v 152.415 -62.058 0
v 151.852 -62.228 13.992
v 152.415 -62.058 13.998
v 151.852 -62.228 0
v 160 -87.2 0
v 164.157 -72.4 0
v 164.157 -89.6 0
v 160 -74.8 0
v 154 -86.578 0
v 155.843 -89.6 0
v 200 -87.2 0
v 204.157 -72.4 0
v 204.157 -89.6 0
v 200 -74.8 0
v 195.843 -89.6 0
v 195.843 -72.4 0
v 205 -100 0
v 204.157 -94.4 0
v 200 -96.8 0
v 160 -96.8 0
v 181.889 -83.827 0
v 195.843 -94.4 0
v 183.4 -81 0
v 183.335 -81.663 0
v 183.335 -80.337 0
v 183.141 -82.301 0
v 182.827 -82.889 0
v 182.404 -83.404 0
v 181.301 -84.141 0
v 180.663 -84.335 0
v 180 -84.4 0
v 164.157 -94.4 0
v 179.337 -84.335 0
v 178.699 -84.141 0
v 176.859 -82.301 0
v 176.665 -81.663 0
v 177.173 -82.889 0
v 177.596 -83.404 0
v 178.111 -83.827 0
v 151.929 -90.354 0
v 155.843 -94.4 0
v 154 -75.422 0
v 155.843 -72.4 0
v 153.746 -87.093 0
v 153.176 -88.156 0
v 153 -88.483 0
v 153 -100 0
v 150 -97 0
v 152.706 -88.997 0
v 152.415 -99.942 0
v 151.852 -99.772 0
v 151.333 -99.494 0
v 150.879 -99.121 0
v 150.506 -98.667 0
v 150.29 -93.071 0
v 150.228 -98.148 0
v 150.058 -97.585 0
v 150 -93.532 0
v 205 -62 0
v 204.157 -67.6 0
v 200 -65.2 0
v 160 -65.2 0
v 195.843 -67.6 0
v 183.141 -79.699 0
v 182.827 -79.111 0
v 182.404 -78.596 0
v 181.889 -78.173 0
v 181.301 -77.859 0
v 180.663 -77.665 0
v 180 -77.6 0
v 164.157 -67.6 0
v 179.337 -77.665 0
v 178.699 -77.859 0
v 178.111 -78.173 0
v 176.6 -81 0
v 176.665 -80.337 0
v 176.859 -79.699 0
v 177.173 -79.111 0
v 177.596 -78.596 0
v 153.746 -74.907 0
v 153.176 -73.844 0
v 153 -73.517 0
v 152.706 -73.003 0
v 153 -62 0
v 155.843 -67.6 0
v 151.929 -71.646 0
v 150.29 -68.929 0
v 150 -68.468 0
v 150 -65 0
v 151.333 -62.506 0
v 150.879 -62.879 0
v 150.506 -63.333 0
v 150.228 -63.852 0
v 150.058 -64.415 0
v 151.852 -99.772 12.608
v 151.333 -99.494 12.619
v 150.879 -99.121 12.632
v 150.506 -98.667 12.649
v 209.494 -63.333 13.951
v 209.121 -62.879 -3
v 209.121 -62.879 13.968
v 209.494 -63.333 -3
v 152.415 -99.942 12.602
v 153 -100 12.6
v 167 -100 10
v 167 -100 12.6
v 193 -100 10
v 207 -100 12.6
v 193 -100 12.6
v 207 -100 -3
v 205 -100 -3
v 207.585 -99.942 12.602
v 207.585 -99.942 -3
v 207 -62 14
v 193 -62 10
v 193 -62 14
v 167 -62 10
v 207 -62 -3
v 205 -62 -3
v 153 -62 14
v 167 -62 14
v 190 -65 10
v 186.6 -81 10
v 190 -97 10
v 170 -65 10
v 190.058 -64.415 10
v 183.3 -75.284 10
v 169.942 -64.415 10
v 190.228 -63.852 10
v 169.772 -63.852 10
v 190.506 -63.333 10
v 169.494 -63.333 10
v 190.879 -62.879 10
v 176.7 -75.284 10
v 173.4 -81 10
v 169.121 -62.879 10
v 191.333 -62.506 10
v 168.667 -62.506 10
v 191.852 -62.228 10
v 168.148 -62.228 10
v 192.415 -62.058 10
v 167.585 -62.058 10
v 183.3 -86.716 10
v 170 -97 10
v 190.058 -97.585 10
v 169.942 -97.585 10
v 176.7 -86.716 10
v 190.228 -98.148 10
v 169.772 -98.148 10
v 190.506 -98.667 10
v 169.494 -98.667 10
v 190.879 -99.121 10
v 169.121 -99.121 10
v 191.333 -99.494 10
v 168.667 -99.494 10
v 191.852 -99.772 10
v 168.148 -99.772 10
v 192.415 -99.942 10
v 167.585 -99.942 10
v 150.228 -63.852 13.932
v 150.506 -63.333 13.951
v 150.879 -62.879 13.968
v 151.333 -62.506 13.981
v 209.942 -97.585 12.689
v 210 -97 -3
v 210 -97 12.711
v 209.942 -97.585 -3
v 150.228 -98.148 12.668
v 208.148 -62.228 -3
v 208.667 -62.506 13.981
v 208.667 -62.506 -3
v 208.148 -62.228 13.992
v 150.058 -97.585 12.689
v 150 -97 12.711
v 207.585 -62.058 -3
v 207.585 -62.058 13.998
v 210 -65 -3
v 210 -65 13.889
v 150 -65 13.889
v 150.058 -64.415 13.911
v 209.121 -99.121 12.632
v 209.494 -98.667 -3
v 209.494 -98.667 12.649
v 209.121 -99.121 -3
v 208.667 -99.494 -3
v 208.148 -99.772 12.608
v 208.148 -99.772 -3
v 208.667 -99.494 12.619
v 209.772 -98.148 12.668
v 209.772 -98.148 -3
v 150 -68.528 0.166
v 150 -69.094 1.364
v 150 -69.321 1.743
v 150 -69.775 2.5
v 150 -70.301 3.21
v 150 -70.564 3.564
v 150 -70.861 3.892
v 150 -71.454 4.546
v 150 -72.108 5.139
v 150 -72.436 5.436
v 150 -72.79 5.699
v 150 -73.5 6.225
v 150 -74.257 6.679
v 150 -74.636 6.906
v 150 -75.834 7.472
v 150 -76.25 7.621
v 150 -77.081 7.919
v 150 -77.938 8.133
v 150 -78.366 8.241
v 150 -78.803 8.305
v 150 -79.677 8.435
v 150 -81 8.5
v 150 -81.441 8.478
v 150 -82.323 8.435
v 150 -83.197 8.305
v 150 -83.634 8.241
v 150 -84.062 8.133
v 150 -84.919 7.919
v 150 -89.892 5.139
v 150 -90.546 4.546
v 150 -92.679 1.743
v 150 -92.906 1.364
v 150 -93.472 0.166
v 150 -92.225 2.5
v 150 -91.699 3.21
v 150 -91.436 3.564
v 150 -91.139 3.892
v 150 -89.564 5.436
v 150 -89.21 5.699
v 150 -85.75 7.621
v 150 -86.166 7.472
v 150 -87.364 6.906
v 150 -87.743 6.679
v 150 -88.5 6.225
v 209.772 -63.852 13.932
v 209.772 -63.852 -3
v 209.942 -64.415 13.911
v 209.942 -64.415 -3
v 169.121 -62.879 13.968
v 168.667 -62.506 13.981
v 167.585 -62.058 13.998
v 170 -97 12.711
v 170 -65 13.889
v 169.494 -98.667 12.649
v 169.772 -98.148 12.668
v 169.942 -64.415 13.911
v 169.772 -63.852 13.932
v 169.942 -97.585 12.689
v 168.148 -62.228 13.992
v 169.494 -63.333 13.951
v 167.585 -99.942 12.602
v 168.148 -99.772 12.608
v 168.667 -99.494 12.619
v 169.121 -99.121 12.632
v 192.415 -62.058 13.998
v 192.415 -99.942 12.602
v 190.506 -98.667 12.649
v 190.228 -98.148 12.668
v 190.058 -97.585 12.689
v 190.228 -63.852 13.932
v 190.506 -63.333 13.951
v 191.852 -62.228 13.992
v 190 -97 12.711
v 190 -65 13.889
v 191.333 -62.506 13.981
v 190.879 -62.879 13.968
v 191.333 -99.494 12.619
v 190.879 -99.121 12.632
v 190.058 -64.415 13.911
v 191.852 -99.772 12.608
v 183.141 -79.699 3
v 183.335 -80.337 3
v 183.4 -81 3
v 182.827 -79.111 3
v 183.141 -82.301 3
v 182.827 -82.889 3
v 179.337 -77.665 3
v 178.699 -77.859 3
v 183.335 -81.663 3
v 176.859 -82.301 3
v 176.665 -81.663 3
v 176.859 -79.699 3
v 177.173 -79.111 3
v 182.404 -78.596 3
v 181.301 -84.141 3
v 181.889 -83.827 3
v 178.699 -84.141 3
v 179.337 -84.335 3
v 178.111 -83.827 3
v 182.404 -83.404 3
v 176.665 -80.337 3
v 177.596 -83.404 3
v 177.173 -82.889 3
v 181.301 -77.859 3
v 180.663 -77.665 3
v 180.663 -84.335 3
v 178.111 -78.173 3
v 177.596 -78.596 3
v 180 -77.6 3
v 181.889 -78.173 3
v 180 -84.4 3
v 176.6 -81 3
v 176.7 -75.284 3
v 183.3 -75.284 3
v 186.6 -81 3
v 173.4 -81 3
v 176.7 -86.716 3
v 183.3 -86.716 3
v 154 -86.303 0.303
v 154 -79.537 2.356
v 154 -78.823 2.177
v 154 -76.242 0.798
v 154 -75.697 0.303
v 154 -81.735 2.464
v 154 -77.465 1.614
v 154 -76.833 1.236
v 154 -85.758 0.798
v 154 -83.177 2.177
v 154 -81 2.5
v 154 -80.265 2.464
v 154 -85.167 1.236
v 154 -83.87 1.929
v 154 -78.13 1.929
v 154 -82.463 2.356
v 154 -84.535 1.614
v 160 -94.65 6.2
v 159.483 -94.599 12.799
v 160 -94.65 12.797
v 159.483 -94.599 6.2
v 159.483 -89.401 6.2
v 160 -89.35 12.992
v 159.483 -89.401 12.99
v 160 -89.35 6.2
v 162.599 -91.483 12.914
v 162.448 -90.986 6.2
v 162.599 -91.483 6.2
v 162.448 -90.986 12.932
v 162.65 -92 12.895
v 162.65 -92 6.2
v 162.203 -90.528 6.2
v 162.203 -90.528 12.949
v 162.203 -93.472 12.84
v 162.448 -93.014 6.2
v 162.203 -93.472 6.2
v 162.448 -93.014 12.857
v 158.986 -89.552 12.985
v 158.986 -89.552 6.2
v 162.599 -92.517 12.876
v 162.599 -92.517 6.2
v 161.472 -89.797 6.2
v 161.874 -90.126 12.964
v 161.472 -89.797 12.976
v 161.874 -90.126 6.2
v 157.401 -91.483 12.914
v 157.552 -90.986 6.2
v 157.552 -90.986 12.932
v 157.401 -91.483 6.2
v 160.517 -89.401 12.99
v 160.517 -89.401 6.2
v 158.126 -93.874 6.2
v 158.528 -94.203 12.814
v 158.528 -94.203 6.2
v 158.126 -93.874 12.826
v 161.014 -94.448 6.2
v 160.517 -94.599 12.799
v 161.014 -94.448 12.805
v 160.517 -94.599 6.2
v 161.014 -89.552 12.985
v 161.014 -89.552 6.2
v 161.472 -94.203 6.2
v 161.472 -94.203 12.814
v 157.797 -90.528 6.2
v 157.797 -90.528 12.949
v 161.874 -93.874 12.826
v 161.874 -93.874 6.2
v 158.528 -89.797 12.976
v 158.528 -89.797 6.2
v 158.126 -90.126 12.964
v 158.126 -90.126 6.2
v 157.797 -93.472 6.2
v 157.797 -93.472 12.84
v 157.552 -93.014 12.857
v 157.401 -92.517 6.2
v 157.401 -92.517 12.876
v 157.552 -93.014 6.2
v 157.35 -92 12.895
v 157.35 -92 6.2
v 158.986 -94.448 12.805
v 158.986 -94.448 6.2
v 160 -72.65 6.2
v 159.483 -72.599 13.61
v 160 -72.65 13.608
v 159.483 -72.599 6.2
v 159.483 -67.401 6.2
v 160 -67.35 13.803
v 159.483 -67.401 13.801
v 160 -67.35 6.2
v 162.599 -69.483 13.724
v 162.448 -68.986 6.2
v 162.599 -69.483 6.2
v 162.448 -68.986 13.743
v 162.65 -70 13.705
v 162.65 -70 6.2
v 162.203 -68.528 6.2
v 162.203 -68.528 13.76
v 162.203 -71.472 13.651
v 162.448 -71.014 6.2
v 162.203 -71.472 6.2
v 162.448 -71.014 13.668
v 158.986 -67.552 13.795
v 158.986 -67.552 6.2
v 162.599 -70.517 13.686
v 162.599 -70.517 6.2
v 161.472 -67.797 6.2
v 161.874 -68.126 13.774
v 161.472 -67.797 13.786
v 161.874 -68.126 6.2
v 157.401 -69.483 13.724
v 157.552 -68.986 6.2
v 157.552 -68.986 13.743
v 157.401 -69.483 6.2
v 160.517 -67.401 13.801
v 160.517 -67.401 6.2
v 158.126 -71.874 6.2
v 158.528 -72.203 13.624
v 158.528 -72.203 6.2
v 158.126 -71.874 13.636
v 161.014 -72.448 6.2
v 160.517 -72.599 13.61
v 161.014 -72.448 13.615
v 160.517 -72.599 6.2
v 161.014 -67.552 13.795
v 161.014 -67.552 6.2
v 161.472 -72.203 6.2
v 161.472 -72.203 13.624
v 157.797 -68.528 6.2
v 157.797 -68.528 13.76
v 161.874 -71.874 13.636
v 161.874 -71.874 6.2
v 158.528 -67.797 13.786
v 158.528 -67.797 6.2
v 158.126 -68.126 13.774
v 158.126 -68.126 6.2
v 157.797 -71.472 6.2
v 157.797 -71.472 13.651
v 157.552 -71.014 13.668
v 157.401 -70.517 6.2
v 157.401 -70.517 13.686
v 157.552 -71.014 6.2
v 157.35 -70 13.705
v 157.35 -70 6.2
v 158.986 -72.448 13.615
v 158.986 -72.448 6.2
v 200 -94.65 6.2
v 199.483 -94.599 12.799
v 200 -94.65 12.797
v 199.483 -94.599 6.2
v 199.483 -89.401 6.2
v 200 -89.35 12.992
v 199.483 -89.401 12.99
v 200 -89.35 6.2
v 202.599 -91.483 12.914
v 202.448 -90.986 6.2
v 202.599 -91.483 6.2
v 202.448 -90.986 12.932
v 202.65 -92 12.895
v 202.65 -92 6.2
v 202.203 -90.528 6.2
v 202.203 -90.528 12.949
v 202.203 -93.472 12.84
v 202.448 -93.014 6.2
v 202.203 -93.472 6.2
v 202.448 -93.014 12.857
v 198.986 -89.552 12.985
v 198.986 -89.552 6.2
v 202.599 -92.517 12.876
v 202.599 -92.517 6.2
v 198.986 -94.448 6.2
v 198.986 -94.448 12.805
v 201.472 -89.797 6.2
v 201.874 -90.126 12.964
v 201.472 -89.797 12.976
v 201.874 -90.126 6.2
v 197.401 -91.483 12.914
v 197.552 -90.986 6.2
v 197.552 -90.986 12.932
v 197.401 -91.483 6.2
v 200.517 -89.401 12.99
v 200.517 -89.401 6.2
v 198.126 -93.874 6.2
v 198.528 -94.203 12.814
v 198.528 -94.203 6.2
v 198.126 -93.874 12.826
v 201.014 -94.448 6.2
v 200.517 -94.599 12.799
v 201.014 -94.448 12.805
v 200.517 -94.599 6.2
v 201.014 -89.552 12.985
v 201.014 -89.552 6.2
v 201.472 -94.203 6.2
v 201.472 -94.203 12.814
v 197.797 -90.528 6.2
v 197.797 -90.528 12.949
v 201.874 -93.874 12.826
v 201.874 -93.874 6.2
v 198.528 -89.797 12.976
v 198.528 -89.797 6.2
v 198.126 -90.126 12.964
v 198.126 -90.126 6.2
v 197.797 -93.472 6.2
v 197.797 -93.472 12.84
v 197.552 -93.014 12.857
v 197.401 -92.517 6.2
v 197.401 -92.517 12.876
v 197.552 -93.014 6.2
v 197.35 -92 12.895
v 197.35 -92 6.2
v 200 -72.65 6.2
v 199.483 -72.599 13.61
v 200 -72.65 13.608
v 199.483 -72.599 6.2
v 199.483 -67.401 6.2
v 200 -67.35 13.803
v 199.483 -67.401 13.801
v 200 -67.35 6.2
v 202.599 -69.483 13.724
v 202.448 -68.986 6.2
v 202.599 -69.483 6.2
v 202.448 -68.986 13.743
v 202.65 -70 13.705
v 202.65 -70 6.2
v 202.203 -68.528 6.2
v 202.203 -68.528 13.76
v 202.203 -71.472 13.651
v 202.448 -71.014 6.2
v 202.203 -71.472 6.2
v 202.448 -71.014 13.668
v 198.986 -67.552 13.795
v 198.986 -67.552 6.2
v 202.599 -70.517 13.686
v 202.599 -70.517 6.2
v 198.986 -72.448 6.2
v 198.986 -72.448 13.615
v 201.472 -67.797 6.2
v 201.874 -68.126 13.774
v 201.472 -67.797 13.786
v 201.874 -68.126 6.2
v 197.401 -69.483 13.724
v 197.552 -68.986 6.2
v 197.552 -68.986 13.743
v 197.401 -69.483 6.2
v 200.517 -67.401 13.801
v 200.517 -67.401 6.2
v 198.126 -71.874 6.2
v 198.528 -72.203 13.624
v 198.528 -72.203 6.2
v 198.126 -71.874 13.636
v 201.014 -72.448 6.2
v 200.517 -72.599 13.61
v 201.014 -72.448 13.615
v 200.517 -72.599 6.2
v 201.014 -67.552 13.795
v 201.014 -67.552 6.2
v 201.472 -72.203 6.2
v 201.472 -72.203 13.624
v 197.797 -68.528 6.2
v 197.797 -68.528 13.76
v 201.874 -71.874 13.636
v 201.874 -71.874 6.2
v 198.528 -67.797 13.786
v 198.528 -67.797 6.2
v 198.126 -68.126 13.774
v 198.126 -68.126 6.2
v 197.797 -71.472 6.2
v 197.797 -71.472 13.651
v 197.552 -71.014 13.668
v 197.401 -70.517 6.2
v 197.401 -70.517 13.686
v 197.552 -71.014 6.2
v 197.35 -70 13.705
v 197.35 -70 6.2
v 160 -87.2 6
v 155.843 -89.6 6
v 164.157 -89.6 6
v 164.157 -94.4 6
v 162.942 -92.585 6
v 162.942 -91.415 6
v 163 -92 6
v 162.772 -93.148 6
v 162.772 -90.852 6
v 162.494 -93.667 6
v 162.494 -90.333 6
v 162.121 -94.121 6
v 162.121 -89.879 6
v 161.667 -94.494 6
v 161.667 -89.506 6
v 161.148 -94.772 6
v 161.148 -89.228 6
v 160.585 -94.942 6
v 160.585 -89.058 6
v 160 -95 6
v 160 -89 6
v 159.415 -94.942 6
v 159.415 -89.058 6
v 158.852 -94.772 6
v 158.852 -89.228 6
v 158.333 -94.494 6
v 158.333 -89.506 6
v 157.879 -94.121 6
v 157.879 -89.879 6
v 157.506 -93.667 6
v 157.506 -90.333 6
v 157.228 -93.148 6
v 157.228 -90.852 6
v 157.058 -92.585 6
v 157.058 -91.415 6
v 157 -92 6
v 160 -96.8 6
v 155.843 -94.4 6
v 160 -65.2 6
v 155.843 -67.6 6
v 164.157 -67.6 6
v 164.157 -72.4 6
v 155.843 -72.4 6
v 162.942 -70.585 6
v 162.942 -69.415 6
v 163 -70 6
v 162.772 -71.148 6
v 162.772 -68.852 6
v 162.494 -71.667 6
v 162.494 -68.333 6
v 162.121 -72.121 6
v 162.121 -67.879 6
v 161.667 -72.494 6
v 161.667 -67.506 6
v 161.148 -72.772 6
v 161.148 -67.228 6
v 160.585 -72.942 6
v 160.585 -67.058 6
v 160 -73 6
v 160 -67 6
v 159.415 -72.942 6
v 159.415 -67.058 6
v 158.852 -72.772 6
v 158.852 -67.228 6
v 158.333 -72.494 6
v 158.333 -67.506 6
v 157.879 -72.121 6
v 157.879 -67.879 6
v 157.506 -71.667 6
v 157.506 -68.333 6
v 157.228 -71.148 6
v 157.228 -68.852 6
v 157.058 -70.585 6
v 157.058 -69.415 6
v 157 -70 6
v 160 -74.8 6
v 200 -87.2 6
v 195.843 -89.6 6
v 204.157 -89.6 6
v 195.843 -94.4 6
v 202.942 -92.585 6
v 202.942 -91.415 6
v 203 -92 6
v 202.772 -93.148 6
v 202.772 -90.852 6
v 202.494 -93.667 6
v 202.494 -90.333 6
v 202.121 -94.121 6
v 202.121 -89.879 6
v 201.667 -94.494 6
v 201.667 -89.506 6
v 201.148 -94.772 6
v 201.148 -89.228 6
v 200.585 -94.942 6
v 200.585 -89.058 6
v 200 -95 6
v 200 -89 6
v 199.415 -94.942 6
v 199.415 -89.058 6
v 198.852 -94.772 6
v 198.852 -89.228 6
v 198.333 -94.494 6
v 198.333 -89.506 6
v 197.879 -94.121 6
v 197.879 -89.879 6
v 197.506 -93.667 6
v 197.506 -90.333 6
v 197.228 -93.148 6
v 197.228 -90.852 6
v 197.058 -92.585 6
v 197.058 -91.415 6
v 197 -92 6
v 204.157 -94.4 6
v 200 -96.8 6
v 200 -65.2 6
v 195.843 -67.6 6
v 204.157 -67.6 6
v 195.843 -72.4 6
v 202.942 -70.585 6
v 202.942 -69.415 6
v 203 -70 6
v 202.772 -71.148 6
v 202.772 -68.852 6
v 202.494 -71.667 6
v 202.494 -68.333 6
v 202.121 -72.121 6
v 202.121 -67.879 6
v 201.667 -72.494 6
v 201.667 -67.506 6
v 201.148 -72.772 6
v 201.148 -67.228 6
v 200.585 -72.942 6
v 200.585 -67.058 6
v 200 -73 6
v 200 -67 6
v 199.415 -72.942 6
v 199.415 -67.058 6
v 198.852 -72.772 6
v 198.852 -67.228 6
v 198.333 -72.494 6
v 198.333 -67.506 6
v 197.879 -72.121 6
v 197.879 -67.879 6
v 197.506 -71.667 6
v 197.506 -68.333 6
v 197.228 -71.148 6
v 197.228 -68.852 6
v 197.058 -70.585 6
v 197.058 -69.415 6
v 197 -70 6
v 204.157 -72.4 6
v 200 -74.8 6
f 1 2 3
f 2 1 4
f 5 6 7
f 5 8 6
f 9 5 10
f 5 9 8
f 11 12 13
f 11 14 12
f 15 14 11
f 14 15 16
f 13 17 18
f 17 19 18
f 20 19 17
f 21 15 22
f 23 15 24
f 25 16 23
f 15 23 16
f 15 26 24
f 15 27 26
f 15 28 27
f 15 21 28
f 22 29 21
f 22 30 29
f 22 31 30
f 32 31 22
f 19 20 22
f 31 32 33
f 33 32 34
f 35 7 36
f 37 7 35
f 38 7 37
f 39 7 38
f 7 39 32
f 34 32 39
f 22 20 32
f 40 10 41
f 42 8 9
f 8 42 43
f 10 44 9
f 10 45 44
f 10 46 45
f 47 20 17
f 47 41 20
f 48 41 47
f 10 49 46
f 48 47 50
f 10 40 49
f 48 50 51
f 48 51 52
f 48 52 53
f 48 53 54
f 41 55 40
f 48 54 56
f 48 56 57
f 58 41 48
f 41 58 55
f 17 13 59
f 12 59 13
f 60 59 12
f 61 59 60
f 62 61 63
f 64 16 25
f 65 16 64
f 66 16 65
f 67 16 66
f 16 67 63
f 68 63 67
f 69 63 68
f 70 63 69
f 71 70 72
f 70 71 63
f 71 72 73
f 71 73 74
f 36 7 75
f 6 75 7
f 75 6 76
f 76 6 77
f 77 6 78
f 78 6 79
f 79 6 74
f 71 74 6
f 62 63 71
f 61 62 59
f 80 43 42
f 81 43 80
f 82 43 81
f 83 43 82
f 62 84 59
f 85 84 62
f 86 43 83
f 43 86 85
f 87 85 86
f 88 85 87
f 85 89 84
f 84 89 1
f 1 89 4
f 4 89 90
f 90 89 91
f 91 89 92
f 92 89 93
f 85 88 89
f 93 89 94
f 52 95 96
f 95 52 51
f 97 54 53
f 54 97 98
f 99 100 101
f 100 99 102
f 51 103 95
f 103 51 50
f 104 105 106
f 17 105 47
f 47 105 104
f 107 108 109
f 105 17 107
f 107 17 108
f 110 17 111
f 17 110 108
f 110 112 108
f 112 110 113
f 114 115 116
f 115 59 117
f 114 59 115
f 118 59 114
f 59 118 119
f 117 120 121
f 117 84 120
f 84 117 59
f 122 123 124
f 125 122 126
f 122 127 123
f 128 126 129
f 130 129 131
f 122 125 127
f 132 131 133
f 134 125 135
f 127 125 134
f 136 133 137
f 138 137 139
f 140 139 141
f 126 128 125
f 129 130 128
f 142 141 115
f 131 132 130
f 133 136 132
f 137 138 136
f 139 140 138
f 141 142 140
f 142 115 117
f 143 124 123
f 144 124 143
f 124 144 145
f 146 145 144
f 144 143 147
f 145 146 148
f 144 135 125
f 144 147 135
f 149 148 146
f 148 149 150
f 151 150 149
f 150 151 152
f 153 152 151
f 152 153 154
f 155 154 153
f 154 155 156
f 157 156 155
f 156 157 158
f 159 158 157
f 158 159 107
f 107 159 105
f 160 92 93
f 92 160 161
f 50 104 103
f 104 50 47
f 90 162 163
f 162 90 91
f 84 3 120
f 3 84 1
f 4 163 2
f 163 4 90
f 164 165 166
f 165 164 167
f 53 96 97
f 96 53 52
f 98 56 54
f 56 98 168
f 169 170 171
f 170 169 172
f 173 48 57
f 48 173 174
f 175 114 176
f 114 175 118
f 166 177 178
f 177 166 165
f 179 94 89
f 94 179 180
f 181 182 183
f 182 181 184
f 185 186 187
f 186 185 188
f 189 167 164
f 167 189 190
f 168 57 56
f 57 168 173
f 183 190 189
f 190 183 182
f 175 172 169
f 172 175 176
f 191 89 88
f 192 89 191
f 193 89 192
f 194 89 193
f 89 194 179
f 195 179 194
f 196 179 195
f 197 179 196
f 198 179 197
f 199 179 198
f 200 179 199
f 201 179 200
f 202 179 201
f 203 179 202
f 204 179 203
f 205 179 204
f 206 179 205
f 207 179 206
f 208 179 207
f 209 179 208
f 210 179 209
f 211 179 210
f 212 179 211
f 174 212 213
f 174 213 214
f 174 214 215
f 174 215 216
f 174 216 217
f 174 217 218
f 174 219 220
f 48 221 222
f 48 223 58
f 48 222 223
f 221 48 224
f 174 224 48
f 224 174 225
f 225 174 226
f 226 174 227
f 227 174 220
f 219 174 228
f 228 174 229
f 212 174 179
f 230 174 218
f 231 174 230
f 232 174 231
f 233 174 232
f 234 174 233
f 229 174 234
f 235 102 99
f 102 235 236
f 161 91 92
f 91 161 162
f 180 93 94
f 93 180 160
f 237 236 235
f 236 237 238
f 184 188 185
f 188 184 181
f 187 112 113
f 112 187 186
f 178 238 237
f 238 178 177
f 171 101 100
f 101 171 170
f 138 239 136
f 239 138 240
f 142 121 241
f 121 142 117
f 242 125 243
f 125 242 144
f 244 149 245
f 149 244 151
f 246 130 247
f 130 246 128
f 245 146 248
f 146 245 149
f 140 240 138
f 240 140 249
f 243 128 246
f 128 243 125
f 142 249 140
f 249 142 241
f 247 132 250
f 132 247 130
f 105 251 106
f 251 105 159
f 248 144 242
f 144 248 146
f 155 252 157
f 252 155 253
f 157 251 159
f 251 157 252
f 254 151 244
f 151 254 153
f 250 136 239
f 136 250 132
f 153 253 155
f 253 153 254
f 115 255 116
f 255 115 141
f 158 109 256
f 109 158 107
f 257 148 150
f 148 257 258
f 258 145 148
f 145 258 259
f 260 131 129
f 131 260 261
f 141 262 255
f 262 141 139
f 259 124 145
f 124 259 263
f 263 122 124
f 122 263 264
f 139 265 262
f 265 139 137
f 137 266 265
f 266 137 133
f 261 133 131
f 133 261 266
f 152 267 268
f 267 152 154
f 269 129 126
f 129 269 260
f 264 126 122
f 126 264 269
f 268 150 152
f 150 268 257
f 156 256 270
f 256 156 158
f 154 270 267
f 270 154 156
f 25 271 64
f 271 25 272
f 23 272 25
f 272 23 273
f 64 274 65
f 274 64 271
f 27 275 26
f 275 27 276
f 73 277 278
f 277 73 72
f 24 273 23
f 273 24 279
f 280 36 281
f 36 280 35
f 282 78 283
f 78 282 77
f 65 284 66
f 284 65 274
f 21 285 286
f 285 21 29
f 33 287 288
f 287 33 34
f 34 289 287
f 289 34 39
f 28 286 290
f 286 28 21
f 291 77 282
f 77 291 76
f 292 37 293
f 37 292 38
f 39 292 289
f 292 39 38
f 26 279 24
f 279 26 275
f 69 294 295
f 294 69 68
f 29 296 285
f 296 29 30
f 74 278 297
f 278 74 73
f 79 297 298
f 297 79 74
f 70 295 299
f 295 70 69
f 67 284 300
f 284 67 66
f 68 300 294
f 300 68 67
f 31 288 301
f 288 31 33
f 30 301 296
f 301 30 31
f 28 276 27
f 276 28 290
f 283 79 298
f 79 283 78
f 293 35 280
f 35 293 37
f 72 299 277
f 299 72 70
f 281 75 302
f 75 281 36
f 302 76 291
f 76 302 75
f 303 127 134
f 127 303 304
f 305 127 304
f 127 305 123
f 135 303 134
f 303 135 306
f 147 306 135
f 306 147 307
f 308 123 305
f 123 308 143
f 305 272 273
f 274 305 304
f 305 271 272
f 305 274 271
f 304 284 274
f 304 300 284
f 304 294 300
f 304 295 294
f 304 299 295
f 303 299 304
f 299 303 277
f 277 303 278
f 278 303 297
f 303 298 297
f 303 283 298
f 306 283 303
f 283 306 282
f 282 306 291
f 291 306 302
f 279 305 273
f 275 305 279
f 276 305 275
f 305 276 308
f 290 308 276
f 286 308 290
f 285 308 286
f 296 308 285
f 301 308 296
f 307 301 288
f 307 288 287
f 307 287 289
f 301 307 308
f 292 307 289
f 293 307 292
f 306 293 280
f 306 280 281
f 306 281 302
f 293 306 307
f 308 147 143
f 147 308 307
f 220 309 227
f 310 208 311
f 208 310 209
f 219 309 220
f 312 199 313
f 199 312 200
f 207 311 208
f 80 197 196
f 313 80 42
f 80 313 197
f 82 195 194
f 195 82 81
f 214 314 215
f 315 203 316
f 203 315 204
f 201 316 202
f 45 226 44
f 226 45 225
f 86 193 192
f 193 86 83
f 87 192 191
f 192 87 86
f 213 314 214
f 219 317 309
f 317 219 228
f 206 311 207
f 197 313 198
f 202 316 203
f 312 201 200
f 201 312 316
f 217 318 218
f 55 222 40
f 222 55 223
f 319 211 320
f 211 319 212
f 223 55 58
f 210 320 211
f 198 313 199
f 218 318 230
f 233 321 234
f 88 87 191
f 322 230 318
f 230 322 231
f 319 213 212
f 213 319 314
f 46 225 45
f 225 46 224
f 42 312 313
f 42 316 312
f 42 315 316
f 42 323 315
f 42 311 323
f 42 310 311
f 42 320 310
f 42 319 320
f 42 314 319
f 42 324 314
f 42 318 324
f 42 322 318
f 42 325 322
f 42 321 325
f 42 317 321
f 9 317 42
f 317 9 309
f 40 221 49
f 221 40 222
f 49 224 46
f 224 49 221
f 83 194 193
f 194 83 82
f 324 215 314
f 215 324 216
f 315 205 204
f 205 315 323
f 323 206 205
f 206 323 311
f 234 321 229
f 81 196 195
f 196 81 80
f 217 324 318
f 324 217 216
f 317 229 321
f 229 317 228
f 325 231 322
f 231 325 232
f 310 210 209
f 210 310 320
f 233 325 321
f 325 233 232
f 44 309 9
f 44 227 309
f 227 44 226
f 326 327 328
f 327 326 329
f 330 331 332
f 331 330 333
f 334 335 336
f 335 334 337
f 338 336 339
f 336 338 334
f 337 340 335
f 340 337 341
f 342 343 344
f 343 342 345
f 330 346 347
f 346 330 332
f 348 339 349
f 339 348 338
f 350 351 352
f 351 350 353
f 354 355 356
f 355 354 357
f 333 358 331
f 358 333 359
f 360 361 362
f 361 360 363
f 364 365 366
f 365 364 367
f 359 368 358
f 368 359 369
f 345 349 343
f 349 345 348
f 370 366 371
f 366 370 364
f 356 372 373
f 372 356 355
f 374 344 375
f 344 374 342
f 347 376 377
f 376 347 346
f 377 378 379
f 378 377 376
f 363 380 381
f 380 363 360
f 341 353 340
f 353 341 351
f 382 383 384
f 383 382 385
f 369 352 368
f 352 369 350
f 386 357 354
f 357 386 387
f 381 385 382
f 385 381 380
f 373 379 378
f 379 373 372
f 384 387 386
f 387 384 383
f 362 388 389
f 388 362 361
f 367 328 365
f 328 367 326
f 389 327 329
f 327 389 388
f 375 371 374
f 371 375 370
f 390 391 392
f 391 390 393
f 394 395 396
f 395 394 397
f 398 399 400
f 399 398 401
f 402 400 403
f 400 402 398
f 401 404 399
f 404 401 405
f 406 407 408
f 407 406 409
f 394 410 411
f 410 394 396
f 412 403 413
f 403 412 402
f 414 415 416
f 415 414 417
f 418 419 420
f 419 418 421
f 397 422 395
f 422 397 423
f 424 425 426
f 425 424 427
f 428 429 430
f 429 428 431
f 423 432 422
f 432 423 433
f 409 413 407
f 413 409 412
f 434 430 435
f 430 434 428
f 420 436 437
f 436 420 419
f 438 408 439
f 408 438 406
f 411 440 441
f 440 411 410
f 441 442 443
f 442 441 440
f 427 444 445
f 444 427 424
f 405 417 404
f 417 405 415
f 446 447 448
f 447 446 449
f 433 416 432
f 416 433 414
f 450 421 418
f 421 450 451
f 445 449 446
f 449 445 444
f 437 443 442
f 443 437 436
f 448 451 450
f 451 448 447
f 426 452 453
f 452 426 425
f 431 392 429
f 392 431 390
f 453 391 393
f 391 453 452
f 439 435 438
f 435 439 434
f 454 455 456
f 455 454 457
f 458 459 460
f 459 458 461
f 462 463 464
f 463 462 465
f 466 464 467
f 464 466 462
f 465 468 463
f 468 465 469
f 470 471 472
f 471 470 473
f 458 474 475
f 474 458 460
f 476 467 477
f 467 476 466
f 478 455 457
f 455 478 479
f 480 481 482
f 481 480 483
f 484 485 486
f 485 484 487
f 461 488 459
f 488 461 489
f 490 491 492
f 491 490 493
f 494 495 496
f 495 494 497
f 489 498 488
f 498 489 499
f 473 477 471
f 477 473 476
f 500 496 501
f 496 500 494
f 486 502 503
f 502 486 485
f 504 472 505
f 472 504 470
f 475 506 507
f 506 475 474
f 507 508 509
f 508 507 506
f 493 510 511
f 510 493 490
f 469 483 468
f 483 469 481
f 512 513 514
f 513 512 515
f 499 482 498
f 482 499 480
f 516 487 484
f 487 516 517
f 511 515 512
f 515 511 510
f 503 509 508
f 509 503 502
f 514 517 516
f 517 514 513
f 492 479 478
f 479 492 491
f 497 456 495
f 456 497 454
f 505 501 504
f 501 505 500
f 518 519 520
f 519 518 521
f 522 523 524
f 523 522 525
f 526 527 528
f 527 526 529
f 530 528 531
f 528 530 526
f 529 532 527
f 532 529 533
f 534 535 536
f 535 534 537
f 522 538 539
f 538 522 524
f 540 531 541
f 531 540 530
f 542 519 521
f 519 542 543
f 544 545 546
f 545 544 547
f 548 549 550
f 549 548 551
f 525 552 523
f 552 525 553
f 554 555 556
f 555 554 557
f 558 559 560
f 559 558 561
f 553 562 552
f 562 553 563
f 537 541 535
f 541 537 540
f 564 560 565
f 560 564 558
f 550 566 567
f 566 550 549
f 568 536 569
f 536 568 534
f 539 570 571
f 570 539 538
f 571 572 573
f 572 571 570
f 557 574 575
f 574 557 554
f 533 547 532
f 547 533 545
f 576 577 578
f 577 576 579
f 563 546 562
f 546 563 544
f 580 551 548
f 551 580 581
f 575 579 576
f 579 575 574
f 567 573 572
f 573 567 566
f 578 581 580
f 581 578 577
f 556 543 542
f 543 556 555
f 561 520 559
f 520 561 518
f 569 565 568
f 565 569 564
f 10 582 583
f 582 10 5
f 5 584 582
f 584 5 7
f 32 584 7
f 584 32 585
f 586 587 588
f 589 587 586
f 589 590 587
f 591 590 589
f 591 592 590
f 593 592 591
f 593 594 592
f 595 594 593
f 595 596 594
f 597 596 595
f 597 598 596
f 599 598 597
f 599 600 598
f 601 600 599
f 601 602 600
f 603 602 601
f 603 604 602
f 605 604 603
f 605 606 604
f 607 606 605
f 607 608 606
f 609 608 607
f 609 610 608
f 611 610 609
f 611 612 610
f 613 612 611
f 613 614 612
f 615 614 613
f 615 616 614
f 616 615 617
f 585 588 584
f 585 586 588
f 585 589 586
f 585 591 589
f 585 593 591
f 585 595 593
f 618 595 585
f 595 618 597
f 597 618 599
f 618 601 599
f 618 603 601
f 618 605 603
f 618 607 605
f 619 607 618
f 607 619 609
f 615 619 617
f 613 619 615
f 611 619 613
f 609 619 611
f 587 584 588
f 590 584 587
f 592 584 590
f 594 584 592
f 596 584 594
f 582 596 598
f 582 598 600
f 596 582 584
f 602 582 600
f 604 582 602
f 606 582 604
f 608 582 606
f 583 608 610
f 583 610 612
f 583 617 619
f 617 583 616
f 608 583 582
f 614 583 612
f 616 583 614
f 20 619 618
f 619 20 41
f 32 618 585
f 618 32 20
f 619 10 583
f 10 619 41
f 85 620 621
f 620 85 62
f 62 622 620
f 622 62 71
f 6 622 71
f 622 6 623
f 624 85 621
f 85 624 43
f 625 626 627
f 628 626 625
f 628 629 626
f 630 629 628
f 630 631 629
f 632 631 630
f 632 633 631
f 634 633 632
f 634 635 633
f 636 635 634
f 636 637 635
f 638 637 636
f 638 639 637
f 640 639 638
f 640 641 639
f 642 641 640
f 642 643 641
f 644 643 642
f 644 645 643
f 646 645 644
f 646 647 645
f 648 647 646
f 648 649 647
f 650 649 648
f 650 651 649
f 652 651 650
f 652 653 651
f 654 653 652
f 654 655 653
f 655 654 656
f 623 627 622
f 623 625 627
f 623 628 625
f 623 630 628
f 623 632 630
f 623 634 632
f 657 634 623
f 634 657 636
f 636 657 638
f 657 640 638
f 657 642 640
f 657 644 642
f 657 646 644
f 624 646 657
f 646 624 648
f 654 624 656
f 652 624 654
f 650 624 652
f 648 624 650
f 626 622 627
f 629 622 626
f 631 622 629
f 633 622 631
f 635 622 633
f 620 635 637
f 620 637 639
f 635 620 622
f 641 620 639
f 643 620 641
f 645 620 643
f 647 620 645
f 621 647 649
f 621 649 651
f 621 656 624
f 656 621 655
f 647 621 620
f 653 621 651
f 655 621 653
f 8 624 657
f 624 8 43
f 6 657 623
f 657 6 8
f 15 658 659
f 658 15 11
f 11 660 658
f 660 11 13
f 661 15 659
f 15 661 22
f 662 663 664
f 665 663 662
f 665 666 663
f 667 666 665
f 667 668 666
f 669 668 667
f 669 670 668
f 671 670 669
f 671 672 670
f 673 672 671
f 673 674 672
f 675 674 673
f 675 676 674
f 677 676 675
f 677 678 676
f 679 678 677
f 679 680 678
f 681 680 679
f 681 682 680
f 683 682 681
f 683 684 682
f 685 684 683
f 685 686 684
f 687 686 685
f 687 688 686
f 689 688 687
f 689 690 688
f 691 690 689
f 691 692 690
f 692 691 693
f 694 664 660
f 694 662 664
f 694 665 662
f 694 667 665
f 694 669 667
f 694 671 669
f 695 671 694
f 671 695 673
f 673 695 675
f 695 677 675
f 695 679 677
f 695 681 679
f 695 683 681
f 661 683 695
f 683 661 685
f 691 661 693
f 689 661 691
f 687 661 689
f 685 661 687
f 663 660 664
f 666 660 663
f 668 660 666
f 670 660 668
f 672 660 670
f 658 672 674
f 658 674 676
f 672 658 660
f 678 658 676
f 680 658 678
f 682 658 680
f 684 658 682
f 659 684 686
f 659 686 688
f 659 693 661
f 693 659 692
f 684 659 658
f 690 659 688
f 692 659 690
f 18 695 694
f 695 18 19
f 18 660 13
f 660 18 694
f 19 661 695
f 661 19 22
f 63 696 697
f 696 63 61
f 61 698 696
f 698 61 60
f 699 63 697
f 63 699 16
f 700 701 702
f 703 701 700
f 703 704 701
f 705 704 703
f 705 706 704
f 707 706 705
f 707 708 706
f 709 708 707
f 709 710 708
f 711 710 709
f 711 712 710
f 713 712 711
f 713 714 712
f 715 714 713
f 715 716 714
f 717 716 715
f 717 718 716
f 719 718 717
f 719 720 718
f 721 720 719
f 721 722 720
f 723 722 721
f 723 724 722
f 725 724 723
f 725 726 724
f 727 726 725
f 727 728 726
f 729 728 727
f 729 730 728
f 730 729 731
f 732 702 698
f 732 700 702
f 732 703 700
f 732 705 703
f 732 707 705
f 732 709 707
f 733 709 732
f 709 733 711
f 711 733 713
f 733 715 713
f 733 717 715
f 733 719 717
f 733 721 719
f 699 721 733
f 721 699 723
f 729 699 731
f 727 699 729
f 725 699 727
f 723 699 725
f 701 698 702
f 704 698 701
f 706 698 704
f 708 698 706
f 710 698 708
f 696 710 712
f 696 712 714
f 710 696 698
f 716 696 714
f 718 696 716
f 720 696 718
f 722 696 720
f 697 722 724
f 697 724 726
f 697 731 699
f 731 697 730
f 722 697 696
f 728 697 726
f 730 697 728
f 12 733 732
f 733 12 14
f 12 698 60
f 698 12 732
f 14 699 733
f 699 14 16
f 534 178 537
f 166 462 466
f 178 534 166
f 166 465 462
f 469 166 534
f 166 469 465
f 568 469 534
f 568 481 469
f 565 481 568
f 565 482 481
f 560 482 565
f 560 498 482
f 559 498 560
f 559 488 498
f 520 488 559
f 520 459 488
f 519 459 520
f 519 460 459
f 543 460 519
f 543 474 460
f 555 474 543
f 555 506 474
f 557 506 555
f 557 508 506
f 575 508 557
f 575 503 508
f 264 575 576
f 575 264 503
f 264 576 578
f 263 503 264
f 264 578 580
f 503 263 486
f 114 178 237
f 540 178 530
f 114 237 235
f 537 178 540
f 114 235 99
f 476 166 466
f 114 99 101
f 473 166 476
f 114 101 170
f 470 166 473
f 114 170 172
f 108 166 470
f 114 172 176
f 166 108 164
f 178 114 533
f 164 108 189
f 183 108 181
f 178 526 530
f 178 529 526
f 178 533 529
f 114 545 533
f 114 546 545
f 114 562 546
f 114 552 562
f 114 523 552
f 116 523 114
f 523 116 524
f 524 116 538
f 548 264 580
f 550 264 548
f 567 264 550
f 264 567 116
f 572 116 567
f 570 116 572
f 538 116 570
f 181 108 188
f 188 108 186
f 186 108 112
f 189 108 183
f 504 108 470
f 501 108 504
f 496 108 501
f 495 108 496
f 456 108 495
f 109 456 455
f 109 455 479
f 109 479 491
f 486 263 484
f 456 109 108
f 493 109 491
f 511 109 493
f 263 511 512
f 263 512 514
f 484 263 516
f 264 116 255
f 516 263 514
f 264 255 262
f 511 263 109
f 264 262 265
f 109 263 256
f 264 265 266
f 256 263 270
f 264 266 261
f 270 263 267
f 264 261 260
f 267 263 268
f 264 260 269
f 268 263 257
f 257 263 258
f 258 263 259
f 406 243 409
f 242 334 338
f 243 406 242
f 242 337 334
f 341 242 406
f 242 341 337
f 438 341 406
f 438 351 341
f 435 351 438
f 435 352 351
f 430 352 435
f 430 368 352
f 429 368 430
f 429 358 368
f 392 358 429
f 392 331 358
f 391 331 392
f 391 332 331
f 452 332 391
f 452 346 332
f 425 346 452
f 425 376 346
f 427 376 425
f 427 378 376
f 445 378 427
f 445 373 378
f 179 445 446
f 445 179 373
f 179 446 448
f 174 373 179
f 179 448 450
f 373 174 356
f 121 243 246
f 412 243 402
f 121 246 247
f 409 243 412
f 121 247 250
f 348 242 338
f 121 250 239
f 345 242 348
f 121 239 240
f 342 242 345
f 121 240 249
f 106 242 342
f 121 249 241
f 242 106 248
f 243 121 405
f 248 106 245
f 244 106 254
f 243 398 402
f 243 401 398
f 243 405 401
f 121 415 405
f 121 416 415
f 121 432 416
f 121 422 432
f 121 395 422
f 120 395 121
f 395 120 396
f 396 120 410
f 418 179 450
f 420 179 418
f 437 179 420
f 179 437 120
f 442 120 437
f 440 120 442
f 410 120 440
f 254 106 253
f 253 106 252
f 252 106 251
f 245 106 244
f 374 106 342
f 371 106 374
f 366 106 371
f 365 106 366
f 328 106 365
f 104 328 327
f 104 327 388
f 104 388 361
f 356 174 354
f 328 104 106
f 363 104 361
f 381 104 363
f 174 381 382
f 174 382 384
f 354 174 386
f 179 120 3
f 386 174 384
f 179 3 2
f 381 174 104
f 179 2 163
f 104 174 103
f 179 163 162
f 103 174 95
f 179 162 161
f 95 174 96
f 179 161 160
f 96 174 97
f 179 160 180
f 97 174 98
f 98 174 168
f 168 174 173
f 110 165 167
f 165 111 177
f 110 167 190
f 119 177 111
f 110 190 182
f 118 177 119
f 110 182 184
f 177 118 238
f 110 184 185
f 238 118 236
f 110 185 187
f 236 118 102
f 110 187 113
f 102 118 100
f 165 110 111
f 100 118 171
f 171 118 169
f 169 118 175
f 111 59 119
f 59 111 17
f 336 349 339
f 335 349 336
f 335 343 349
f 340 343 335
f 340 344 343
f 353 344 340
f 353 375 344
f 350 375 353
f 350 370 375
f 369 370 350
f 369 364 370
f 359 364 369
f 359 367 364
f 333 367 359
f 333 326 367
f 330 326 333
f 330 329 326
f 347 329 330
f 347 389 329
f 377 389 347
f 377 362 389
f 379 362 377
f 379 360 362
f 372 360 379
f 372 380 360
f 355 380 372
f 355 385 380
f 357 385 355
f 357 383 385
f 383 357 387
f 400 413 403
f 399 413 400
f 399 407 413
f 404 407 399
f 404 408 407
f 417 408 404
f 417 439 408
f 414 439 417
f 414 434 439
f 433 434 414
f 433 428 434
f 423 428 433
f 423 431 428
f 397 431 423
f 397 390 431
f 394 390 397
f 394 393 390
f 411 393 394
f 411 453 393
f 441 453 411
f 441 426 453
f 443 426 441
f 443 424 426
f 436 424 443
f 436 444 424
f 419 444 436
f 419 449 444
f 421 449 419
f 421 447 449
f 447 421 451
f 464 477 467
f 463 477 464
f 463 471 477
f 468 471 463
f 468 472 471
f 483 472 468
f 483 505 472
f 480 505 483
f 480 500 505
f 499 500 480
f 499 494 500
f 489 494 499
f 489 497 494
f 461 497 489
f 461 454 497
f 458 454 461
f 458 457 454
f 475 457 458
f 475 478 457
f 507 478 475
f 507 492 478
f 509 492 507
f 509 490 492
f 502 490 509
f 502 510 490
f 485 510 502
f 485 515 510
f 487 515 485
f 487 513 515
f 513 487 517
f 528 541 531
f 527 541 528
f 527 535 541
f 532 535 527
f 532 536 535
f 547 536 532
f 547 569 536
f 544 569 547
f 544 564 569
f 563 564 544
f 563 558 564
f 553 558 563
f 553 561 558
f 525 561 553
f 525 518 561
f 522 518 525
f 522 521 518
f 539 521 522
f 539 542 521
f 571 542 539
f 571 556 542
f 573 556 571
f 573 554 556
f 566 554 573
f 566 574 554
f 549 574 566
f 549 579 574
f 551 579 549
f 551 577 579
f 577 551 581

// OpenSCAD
// file: ../camera.scad
module camera(longlens=false) {

    translate([0, -17, 0]) {
        cube([40, 17, 67]);
    }
    translate([88, 27, 51]) {
        cube([36, 10, 20]);
    }

    // tripod screw thread
    difference() {
        cube([120, 27, 67]); // <--
        translate([78, 15, -1]) {
            cylinder(h = 5, d = 8);
        }
    }
    translate([78, 15, 3]) {
        color([1, 0, 0]) cylinder(h = 1, d = 8);
    }
    
    // knobs
    translate([20, 15, 67]) {
        cylinder(h = 1.5, d = 14);
    }
    translate([40, 15, 67]) {
        cylinder(h = 1.5, d = 14);
    }
    
    // belt attachment holder
    translate([-6, 20, 54]) {
        cube([6, 1, 6]);
    }
    translate([120, 20, 54]) {
        cube([6, 1, 6]);
    }

    // lens mount and lens
    translate([78, 0, 32]) {
        rotate([90]) {
            color([1,0,0]) cylinder(h = 5, d = 60);
            
            // lens

            color("grey") {
                if (longlens) {
                    translate([0, 0, 5]) {
                        cylinder(h = 63, d = 73);
                    }
                } else {
                    translate([0, 0, 5]) {
                        cylinder(h = 23, d = 62);
                    }
                }
            }
        }
    }
    
    // port door
    translate([120, 8, 9]) cube([9, 1, 27]);
}
// main file
// global variables

filter_diameter = 77;

num_screws = 8;
deg = 360/num_screws;
off = deg/2;

q = 128; //32;

print_support = true;

include <../camera.scad>;
//% translate([78, 35, -32]) rotate([0, 0, 180]) camera(longlens=true);
//% translate([0, 0, 0]) rotate([0, 0, 180]) scale([10, 10, 10]) color("green") import("Peli1120.stl");
//% translate([-26, 10, -50]) color("grey") arca_clamp();
//
//translate([0, 65.9+0]) rotate([-90, 0, 0]) front();
//translate([0, 65.9-5, 0]) rotate([90, 0, 0]) back();
//translate([0, 50, -50]) rotate([180, 0, 0]) bottom();
//translate([0, 10, -90]) socket();
//
//translate([-89, -7, 47]) rotate([-90, 0, 90]) controller_dock();
//translate([-89+0.5, -7, 47-36]) rotate([90, 0, 90]) import("../zeroholder11.stl");
//
//translate([0, -90, 0]) rotate([0, 0, 0]) bottom();
//
//translate([0, 0, 100]) M5Screw();

// --------------------------------------------------------------------------

//translate([180, 0]) front();
//translate([180, 110]) back();
//translate([180, 110]) back2D();
translate([180, -100]) bottom();
//translate([180, -150]) socket();
//translate([240, 0]) controller_dock();


module back2D() {
    projection() back();  
    
//    width = 106.4;
//    translate([-width/2, -width/2]) color("red") cube([width, width, 0.5]);
}

module controller_dock() {
    size = [70, 36];
   
    difference() {
        intersection() {
            union() {
                block(size[0], size[1], 10, crad=4);
            }
            
            points = [[0, 0], [size[0], 0], [size[0], 0.6], [size[0]-1.4, 0.6+1], [7, 5.75], [0, 2]];
            translate([0, size[1]]) rotate([90, 0, 0]) linear_extrude(height=size[1]+2) polygon(points);
        }
        
        // screw
        translate([20, size[1]/2, -1]) rotate([0, 4, 0]) {
            cylinder($fn=32, d=3.3, h=100);
            cylinder($fn=6, d=6.7, h=4.5);
        }
        
        // magnet cavity
        translate([0, 0, -0.1]) color("darkgreen") {
            translate([10, size[1]/2]) cylinder($fn=32, d=8.5, h=1.4);
            translate([size[0]/2, size[1]/2]) cylinder($fn=32, d=8.5, h=1.4);
            translate([size[0]-10, size[1]/2]) cylinder($fn=32, d=8.5, h=1.4);
        }
    }
}

module socket() {
    
    size = [60, 38];
    screw_dist = 8;
    
    intersection() {
        difference() {
            union() {
                translate([-size[0]/2, 0]) block(size[0], size[1], 10);
            } 
            
            // arca screw
            translate([0, 20, -1]) cylinder($fn=32, d=10, h=50); // ?
            translate([0, 20, 2]) cylinder($fn=6, d=15, h=10); // ?

            // screws
            translate([-20, screw_dist, -1]) cylinder($fn=32, d=5.3, h=30);
            translate([-20, size[1]-screw_dist, -1]) cylinder($fn=32, d=5.3, h=30);
            translate([ 20, screw_dist, -1]) cylinder($fn=32, d=5.3, h=30);
            translate([ 20, size[1]-screw_dist, -1]) cylinder($fn=32, d=5.3, h=30);
            translate([-20, screw_dist, -1]) rotate([0, 0, 30]) cylinder($fn=32, d=9, h=7);
            translate([-20, size[1]-screw_dist, -1]) rotate([0, 0, 30]) cylinder($fn=32, d=9, h=7);
            translate([ 20, screw_dist, -1]) rotate([0, 0, 30]) cylinder($fn=32, d=9, h=7);
            translate([ 20, size[1]-screw_dist, -1]) rotate([0, 0, 30]) cylinder($fn=32, d=9, h=7);
        }
        
        // top surface
        a = 10.0;
        b = a-1.4;
        points = [[0, 0], [size[1], 0], [size[1], a], [0, b]];
        translate([-30, 0, 0]) rotate([90, 0, 90]) linear_extrude(height=60) polygon(points);
    }
    
    if (print_support) color("orange") {
        translate([-20, screw_dist, 6]) cylinder($fn=32, d=6, h=0.2);
        translate([-20, size[1]-screw_dist, 6]) cylinder($fn=32, d=6, h=0.2);
        translate([20, screw_dist, 6]) cylinder($fn=32, d=6, h=0.2);
        translate([20, size[1]-screw_dist, 6]) cylinder($fn=32, d=6, h=0.2);
    }
}

module bottom() {
    
    size = [60, 38];
    screw_dist = 8;
    
    intersection() {
        difference() {
            union() {
                translate([-size[0]/2, 0]) block(size[0], size[1], 10);
                
                translate([-size[0]/2, 0]) block(20, size[1], 14);
                translate([10, 0]) block(20, size[1], 14);
            } 
            
            // arca screw
            translate([0, size[1]/2, -1]) cylinder($fn=32, d=6.3+0.5, h=50); 
            
            // 1/4 screw head cavity
//            translate([0, size[1]/2, 3]) cylinder($fn=32, d=10, h=10); 
            // 1/4 screw nut cavity
            translate([0, size[1]/2, 3]) cylinder($fn=6, d=13.2, h=10); 
            
            // knob cavity
            translate([-47+11, size[1]/2, -5]) rotate([0, 90, 0]) cylinder($fn=64, d1=45, d2=15, h=10);
            
            // screws
            translate([-20, screw_dist, -1]) cylinder($fn=32, d=5.3, h=30);
            translate([-20, size[1]-screw_dist, -1]) cylinder($fn=32, d=5.3, h=30);
            translate([20, screw_dist, -1]) cylinder($fn=32, d=5.3, h=30);
            translate([20, size[1]-screw_dist, -1]) cylinder($fn=32, d=5.3, h=30);
            translate([-20, screw_dist, -1]) rotate([0, 0, 30]) cylinder($fn=6, d=9.6, h=7);
            translate([-20, size[1]-screw_dist, -1]) rotate([0, 0, 30]) cylinder($fn=6, d=9.6, h=7);
            translate([20, screw_dist, -1]) rotate([0, 0, 30]) cylinder($fn=6, d=9.6, h=7);
            translate([20, size[1]-screw_dist, -1]) rotate([0, 0, 30]) cylinder($fn=6, d=9.6, h=7);
        }
        
        // top surface
        a = 14.0;
        b = a-1.4;
        points = [[0, 0], [size[1], 0], [size[1], a], [0, b]];
        translate([-30, 0, 0]) rotate([90, 0, 90]) linear_extrude(height=60) polygon(points);
    }
    
    difference() {  
        translate([size[0]/2-10, 0, -3]) block(10, size[1], 3);
        translate([0, -1, -3-1]) cube([size[0]/2-5, size[1]+2, 10]);
    }
    
    if (print_support) color("orange") {
        translate([-20, screw_dist, 6]) cylinder($fn=32, d=6, h=0.2);
        translate([-20, size[1]-screw_dist, 6]) cylinder($fn=32, d=6, h=0.2);
        translate([20, screw_dist, 6]) cylinder($fn=32, d=6, h=0.2);
        translate([20, size[1]-screw_dist, 6]) cylinder($fn=32, d=6, h=0.2);
    }
}

module back() {
//    x = 35.35;
//    
//    difference() {
//        union() {
//            translate([x, 10, 0]) cylinder($fn=32, d=14, h=10);
//            translate([-x, 10, 0]) cylinder($fn=32, d=14, h=10);
//        }
//        
//        translate([x, 10, -1]) cylinder($fn=32, d=5.3, h=20);
//        translate([-x, 10, -1]) cylinder($fn=32, d=5.3, h=20);
//        
//        translate([x, 10, 5]) cylinder($fn=6, d=9.6, h=20);
//        translate([-x, 10, 5]) cylinder($fn=6, d=9.6, h=20);
//    }
    
    difference() {
        union() {
            cylinder($fn=64, d=90+14, h=3);
            translate([0, 0, 3]) cylinder($fn=64, d1=90+14, d2=90+14-2, h=1);
            
            // screw support
            for(i = [0 : num_screws]) rotate([0, 0, off+deg*i]) translate([50, 0, 0]) {
                cylinder($fn=32, d=14, h=6);
                translate([0, 0, 6]) cylinder($fn=32, d1=14, d2=14-2, h=1);
            }
                
            // base angle
            points = [  [-50, 15], [-50, 30], [0, 5], [50, 30], [50, 15], 
                        [20, -12], [-20, -12]
            ];
            
            // translate([0, -50, 0]) linear_extrude(height=5) polygon(points);
        }
        
        // main hole
        translate([0, 0, -1]) cylinder($fn=64, d=filter_diameter, h=10);
        translate([0, 0, 3]) cylinder($fn=64, d1=filter_diameter, d2=filter_diameter+2, h=1+.1);
    
        // screw holes
        for(i = [0 : num_screws]) rotate([0, 0, off+deg*i]) translate([50, 0, -1]) cylinder($fn=32, d=5.3, h=50);
        for(i = [0 : num_screws]) rotate([0, 0, off+deg*i]) translate([50, 0, 3]) rotate([0, 0, 30]) cylinder($fn=6, d=9.6, h=50);
    }
    
    * difference() {
        union() {
            translate([-20, -52, 0]) rotate([90, 0, 0]) block(40, 60, 10);
        }
        translate([0, 0, 40]) rotate([90, 0, 0]) cylinder($fn=32, d=10, h=100);
        translate([0, -60, 40]) rotate([90, 0, 0]) cylinder($fn=32, d=14, h=10);
    }
}

module front() {
    
    height = 42;
    
    // 76mm / 86mm drill
    
    // filter sizes:
    // 67 72 77 82 86 95 112
    //             --
    
    // drill: 86 | filter: 86
//    outer_diam = 96;
//    screw_dist = 53;
//    hole_diam = 86;
//    filter_diam = 86;
    
    // drill: 76 | filter: 77
    outer_diam = 88;
    screw_dist = 50;
    hole_diam = 76;
    filter_diam = 77;
    
    difference() {
        union() {
                                        cylinder($fn=q, d=outer_diam+14, h=6);
            translate([0, 0, 6])        cylinder($fn=q, d1=outer_diam+14, d2=outer_diam+14-2, h=2);
            translate([0, 0, 8])        cylinder($fn=q, d1=outer_diam+8, d2=outer_diam, h=8);
                                        cylinder($fn=q, d=outer_diam, h=height-2);
            translate([0, 0, height-2]) cylinder($fn=q, d1=outer_diam, d2=outer_diam-2, h=2);
            
            for(i = [0 : num_screws]) rotate([0, 0, off+deg*i]) translate([screw_dist, 0, 0]) cylinder($fn=32, d=14, h=8);
        }
        
        // main hole
        translate([0, 0, -1]) cylinder($fn=q, d=hole_diam, h=100);
    
        // filter cavity
        translate([0, 0, height-3.5]) color("red") cylinder($fn=64, d=filter_diam+1, h=10);
        translate([0, 0, height-5]) color("red") cylinder($fn=64, d=filter_diam+2, h=10);
    
        // o-ring cavity
        * difference() {
            hull() {
                translate([0, 0, -.1]) cylinder($fn=q, d=88, h=0.75);
                translate([0, 0, 0.75+0.5]) cylinder($fn=q, d1=88-1, h=0.1);
            }
            union() {
                translate([0, 0, -1]) cylinder($fn=q, d=88-2*2.0, h=2);
                translate([0, 0, 0.75]) cylinder($fn=q, d1=88-2*2.0, d2=88-2*2.0+1, h=0.5);
                translate([0, 0, 1.5]) cylinder($fn=q, d=88-2*2.0+1, h=1);
            }
        }
        
        
        // screw holes
        for(i = [0 : num_screws]) rotate([0, 0, off+deg*i]) translate([screw_dist, 0, -1]) cylinder($fn=32, d=5.3, h=50);
        for(i = [0 : num_screws]) rotate([0, 0, off+deg*i]) translate([screw_dist, 0, 6]) cylinder($fn=32, d=9, h=50);
    }
    
    // screws 
    % for(i = [0 : num_screws]) rotate([0, 0, off+deg*i]) translate([screw_dist, 0, 06]) M5Screw(length=18);
       
}

module arca_clamp() {
    difference() {
        block(51.5, 38, 15, crad=1);
        translate([11, -1, 10]) cube([51.5-11-8, 40, 10]);
        translate([26, 38/2, -1]) cylinder($fn=32, d=10, h=20);
        translate([26, 0, -1]) cylinder($fn=32, d=1, h=20);
    }
    translate([-7, 20, 6]) rotate([0, 90, 0]) cylinder($fn=32, d2=9, d1=20, h=7);
    translate([-20, 20, 6]) rotate([0, 90, 0]) cylinder(d=20, h=13);
}

module M5Screw(length=10) {
    rotate([180, 0, 0]) color("grey") {
        translate([]) cylinder(d=5, h=length);
        difference() {
            translate([0, 0, -4.8]) cylinder(d=8.2, h=4.8);
            translate([0, 0, -6]) cylinder($fn=6, d=5, h=4);
        }
    }
}

module block(width, depth, height, crad=3, red=0) {
    hull() {    
        translate([crad, crad]) cylinder($fn=32, h=height, r=crad-red);
        translate([width-crad, crad]) cylinder($fn=32, h=height, r=crad-red);
        translate([crad, depth-crad]) cylinder($fn=32, h=height, r=crad-red);
        translate([width-crad, depth-crad]) cylinder($fn=32, h=height, r=crad-red);
    }
}
